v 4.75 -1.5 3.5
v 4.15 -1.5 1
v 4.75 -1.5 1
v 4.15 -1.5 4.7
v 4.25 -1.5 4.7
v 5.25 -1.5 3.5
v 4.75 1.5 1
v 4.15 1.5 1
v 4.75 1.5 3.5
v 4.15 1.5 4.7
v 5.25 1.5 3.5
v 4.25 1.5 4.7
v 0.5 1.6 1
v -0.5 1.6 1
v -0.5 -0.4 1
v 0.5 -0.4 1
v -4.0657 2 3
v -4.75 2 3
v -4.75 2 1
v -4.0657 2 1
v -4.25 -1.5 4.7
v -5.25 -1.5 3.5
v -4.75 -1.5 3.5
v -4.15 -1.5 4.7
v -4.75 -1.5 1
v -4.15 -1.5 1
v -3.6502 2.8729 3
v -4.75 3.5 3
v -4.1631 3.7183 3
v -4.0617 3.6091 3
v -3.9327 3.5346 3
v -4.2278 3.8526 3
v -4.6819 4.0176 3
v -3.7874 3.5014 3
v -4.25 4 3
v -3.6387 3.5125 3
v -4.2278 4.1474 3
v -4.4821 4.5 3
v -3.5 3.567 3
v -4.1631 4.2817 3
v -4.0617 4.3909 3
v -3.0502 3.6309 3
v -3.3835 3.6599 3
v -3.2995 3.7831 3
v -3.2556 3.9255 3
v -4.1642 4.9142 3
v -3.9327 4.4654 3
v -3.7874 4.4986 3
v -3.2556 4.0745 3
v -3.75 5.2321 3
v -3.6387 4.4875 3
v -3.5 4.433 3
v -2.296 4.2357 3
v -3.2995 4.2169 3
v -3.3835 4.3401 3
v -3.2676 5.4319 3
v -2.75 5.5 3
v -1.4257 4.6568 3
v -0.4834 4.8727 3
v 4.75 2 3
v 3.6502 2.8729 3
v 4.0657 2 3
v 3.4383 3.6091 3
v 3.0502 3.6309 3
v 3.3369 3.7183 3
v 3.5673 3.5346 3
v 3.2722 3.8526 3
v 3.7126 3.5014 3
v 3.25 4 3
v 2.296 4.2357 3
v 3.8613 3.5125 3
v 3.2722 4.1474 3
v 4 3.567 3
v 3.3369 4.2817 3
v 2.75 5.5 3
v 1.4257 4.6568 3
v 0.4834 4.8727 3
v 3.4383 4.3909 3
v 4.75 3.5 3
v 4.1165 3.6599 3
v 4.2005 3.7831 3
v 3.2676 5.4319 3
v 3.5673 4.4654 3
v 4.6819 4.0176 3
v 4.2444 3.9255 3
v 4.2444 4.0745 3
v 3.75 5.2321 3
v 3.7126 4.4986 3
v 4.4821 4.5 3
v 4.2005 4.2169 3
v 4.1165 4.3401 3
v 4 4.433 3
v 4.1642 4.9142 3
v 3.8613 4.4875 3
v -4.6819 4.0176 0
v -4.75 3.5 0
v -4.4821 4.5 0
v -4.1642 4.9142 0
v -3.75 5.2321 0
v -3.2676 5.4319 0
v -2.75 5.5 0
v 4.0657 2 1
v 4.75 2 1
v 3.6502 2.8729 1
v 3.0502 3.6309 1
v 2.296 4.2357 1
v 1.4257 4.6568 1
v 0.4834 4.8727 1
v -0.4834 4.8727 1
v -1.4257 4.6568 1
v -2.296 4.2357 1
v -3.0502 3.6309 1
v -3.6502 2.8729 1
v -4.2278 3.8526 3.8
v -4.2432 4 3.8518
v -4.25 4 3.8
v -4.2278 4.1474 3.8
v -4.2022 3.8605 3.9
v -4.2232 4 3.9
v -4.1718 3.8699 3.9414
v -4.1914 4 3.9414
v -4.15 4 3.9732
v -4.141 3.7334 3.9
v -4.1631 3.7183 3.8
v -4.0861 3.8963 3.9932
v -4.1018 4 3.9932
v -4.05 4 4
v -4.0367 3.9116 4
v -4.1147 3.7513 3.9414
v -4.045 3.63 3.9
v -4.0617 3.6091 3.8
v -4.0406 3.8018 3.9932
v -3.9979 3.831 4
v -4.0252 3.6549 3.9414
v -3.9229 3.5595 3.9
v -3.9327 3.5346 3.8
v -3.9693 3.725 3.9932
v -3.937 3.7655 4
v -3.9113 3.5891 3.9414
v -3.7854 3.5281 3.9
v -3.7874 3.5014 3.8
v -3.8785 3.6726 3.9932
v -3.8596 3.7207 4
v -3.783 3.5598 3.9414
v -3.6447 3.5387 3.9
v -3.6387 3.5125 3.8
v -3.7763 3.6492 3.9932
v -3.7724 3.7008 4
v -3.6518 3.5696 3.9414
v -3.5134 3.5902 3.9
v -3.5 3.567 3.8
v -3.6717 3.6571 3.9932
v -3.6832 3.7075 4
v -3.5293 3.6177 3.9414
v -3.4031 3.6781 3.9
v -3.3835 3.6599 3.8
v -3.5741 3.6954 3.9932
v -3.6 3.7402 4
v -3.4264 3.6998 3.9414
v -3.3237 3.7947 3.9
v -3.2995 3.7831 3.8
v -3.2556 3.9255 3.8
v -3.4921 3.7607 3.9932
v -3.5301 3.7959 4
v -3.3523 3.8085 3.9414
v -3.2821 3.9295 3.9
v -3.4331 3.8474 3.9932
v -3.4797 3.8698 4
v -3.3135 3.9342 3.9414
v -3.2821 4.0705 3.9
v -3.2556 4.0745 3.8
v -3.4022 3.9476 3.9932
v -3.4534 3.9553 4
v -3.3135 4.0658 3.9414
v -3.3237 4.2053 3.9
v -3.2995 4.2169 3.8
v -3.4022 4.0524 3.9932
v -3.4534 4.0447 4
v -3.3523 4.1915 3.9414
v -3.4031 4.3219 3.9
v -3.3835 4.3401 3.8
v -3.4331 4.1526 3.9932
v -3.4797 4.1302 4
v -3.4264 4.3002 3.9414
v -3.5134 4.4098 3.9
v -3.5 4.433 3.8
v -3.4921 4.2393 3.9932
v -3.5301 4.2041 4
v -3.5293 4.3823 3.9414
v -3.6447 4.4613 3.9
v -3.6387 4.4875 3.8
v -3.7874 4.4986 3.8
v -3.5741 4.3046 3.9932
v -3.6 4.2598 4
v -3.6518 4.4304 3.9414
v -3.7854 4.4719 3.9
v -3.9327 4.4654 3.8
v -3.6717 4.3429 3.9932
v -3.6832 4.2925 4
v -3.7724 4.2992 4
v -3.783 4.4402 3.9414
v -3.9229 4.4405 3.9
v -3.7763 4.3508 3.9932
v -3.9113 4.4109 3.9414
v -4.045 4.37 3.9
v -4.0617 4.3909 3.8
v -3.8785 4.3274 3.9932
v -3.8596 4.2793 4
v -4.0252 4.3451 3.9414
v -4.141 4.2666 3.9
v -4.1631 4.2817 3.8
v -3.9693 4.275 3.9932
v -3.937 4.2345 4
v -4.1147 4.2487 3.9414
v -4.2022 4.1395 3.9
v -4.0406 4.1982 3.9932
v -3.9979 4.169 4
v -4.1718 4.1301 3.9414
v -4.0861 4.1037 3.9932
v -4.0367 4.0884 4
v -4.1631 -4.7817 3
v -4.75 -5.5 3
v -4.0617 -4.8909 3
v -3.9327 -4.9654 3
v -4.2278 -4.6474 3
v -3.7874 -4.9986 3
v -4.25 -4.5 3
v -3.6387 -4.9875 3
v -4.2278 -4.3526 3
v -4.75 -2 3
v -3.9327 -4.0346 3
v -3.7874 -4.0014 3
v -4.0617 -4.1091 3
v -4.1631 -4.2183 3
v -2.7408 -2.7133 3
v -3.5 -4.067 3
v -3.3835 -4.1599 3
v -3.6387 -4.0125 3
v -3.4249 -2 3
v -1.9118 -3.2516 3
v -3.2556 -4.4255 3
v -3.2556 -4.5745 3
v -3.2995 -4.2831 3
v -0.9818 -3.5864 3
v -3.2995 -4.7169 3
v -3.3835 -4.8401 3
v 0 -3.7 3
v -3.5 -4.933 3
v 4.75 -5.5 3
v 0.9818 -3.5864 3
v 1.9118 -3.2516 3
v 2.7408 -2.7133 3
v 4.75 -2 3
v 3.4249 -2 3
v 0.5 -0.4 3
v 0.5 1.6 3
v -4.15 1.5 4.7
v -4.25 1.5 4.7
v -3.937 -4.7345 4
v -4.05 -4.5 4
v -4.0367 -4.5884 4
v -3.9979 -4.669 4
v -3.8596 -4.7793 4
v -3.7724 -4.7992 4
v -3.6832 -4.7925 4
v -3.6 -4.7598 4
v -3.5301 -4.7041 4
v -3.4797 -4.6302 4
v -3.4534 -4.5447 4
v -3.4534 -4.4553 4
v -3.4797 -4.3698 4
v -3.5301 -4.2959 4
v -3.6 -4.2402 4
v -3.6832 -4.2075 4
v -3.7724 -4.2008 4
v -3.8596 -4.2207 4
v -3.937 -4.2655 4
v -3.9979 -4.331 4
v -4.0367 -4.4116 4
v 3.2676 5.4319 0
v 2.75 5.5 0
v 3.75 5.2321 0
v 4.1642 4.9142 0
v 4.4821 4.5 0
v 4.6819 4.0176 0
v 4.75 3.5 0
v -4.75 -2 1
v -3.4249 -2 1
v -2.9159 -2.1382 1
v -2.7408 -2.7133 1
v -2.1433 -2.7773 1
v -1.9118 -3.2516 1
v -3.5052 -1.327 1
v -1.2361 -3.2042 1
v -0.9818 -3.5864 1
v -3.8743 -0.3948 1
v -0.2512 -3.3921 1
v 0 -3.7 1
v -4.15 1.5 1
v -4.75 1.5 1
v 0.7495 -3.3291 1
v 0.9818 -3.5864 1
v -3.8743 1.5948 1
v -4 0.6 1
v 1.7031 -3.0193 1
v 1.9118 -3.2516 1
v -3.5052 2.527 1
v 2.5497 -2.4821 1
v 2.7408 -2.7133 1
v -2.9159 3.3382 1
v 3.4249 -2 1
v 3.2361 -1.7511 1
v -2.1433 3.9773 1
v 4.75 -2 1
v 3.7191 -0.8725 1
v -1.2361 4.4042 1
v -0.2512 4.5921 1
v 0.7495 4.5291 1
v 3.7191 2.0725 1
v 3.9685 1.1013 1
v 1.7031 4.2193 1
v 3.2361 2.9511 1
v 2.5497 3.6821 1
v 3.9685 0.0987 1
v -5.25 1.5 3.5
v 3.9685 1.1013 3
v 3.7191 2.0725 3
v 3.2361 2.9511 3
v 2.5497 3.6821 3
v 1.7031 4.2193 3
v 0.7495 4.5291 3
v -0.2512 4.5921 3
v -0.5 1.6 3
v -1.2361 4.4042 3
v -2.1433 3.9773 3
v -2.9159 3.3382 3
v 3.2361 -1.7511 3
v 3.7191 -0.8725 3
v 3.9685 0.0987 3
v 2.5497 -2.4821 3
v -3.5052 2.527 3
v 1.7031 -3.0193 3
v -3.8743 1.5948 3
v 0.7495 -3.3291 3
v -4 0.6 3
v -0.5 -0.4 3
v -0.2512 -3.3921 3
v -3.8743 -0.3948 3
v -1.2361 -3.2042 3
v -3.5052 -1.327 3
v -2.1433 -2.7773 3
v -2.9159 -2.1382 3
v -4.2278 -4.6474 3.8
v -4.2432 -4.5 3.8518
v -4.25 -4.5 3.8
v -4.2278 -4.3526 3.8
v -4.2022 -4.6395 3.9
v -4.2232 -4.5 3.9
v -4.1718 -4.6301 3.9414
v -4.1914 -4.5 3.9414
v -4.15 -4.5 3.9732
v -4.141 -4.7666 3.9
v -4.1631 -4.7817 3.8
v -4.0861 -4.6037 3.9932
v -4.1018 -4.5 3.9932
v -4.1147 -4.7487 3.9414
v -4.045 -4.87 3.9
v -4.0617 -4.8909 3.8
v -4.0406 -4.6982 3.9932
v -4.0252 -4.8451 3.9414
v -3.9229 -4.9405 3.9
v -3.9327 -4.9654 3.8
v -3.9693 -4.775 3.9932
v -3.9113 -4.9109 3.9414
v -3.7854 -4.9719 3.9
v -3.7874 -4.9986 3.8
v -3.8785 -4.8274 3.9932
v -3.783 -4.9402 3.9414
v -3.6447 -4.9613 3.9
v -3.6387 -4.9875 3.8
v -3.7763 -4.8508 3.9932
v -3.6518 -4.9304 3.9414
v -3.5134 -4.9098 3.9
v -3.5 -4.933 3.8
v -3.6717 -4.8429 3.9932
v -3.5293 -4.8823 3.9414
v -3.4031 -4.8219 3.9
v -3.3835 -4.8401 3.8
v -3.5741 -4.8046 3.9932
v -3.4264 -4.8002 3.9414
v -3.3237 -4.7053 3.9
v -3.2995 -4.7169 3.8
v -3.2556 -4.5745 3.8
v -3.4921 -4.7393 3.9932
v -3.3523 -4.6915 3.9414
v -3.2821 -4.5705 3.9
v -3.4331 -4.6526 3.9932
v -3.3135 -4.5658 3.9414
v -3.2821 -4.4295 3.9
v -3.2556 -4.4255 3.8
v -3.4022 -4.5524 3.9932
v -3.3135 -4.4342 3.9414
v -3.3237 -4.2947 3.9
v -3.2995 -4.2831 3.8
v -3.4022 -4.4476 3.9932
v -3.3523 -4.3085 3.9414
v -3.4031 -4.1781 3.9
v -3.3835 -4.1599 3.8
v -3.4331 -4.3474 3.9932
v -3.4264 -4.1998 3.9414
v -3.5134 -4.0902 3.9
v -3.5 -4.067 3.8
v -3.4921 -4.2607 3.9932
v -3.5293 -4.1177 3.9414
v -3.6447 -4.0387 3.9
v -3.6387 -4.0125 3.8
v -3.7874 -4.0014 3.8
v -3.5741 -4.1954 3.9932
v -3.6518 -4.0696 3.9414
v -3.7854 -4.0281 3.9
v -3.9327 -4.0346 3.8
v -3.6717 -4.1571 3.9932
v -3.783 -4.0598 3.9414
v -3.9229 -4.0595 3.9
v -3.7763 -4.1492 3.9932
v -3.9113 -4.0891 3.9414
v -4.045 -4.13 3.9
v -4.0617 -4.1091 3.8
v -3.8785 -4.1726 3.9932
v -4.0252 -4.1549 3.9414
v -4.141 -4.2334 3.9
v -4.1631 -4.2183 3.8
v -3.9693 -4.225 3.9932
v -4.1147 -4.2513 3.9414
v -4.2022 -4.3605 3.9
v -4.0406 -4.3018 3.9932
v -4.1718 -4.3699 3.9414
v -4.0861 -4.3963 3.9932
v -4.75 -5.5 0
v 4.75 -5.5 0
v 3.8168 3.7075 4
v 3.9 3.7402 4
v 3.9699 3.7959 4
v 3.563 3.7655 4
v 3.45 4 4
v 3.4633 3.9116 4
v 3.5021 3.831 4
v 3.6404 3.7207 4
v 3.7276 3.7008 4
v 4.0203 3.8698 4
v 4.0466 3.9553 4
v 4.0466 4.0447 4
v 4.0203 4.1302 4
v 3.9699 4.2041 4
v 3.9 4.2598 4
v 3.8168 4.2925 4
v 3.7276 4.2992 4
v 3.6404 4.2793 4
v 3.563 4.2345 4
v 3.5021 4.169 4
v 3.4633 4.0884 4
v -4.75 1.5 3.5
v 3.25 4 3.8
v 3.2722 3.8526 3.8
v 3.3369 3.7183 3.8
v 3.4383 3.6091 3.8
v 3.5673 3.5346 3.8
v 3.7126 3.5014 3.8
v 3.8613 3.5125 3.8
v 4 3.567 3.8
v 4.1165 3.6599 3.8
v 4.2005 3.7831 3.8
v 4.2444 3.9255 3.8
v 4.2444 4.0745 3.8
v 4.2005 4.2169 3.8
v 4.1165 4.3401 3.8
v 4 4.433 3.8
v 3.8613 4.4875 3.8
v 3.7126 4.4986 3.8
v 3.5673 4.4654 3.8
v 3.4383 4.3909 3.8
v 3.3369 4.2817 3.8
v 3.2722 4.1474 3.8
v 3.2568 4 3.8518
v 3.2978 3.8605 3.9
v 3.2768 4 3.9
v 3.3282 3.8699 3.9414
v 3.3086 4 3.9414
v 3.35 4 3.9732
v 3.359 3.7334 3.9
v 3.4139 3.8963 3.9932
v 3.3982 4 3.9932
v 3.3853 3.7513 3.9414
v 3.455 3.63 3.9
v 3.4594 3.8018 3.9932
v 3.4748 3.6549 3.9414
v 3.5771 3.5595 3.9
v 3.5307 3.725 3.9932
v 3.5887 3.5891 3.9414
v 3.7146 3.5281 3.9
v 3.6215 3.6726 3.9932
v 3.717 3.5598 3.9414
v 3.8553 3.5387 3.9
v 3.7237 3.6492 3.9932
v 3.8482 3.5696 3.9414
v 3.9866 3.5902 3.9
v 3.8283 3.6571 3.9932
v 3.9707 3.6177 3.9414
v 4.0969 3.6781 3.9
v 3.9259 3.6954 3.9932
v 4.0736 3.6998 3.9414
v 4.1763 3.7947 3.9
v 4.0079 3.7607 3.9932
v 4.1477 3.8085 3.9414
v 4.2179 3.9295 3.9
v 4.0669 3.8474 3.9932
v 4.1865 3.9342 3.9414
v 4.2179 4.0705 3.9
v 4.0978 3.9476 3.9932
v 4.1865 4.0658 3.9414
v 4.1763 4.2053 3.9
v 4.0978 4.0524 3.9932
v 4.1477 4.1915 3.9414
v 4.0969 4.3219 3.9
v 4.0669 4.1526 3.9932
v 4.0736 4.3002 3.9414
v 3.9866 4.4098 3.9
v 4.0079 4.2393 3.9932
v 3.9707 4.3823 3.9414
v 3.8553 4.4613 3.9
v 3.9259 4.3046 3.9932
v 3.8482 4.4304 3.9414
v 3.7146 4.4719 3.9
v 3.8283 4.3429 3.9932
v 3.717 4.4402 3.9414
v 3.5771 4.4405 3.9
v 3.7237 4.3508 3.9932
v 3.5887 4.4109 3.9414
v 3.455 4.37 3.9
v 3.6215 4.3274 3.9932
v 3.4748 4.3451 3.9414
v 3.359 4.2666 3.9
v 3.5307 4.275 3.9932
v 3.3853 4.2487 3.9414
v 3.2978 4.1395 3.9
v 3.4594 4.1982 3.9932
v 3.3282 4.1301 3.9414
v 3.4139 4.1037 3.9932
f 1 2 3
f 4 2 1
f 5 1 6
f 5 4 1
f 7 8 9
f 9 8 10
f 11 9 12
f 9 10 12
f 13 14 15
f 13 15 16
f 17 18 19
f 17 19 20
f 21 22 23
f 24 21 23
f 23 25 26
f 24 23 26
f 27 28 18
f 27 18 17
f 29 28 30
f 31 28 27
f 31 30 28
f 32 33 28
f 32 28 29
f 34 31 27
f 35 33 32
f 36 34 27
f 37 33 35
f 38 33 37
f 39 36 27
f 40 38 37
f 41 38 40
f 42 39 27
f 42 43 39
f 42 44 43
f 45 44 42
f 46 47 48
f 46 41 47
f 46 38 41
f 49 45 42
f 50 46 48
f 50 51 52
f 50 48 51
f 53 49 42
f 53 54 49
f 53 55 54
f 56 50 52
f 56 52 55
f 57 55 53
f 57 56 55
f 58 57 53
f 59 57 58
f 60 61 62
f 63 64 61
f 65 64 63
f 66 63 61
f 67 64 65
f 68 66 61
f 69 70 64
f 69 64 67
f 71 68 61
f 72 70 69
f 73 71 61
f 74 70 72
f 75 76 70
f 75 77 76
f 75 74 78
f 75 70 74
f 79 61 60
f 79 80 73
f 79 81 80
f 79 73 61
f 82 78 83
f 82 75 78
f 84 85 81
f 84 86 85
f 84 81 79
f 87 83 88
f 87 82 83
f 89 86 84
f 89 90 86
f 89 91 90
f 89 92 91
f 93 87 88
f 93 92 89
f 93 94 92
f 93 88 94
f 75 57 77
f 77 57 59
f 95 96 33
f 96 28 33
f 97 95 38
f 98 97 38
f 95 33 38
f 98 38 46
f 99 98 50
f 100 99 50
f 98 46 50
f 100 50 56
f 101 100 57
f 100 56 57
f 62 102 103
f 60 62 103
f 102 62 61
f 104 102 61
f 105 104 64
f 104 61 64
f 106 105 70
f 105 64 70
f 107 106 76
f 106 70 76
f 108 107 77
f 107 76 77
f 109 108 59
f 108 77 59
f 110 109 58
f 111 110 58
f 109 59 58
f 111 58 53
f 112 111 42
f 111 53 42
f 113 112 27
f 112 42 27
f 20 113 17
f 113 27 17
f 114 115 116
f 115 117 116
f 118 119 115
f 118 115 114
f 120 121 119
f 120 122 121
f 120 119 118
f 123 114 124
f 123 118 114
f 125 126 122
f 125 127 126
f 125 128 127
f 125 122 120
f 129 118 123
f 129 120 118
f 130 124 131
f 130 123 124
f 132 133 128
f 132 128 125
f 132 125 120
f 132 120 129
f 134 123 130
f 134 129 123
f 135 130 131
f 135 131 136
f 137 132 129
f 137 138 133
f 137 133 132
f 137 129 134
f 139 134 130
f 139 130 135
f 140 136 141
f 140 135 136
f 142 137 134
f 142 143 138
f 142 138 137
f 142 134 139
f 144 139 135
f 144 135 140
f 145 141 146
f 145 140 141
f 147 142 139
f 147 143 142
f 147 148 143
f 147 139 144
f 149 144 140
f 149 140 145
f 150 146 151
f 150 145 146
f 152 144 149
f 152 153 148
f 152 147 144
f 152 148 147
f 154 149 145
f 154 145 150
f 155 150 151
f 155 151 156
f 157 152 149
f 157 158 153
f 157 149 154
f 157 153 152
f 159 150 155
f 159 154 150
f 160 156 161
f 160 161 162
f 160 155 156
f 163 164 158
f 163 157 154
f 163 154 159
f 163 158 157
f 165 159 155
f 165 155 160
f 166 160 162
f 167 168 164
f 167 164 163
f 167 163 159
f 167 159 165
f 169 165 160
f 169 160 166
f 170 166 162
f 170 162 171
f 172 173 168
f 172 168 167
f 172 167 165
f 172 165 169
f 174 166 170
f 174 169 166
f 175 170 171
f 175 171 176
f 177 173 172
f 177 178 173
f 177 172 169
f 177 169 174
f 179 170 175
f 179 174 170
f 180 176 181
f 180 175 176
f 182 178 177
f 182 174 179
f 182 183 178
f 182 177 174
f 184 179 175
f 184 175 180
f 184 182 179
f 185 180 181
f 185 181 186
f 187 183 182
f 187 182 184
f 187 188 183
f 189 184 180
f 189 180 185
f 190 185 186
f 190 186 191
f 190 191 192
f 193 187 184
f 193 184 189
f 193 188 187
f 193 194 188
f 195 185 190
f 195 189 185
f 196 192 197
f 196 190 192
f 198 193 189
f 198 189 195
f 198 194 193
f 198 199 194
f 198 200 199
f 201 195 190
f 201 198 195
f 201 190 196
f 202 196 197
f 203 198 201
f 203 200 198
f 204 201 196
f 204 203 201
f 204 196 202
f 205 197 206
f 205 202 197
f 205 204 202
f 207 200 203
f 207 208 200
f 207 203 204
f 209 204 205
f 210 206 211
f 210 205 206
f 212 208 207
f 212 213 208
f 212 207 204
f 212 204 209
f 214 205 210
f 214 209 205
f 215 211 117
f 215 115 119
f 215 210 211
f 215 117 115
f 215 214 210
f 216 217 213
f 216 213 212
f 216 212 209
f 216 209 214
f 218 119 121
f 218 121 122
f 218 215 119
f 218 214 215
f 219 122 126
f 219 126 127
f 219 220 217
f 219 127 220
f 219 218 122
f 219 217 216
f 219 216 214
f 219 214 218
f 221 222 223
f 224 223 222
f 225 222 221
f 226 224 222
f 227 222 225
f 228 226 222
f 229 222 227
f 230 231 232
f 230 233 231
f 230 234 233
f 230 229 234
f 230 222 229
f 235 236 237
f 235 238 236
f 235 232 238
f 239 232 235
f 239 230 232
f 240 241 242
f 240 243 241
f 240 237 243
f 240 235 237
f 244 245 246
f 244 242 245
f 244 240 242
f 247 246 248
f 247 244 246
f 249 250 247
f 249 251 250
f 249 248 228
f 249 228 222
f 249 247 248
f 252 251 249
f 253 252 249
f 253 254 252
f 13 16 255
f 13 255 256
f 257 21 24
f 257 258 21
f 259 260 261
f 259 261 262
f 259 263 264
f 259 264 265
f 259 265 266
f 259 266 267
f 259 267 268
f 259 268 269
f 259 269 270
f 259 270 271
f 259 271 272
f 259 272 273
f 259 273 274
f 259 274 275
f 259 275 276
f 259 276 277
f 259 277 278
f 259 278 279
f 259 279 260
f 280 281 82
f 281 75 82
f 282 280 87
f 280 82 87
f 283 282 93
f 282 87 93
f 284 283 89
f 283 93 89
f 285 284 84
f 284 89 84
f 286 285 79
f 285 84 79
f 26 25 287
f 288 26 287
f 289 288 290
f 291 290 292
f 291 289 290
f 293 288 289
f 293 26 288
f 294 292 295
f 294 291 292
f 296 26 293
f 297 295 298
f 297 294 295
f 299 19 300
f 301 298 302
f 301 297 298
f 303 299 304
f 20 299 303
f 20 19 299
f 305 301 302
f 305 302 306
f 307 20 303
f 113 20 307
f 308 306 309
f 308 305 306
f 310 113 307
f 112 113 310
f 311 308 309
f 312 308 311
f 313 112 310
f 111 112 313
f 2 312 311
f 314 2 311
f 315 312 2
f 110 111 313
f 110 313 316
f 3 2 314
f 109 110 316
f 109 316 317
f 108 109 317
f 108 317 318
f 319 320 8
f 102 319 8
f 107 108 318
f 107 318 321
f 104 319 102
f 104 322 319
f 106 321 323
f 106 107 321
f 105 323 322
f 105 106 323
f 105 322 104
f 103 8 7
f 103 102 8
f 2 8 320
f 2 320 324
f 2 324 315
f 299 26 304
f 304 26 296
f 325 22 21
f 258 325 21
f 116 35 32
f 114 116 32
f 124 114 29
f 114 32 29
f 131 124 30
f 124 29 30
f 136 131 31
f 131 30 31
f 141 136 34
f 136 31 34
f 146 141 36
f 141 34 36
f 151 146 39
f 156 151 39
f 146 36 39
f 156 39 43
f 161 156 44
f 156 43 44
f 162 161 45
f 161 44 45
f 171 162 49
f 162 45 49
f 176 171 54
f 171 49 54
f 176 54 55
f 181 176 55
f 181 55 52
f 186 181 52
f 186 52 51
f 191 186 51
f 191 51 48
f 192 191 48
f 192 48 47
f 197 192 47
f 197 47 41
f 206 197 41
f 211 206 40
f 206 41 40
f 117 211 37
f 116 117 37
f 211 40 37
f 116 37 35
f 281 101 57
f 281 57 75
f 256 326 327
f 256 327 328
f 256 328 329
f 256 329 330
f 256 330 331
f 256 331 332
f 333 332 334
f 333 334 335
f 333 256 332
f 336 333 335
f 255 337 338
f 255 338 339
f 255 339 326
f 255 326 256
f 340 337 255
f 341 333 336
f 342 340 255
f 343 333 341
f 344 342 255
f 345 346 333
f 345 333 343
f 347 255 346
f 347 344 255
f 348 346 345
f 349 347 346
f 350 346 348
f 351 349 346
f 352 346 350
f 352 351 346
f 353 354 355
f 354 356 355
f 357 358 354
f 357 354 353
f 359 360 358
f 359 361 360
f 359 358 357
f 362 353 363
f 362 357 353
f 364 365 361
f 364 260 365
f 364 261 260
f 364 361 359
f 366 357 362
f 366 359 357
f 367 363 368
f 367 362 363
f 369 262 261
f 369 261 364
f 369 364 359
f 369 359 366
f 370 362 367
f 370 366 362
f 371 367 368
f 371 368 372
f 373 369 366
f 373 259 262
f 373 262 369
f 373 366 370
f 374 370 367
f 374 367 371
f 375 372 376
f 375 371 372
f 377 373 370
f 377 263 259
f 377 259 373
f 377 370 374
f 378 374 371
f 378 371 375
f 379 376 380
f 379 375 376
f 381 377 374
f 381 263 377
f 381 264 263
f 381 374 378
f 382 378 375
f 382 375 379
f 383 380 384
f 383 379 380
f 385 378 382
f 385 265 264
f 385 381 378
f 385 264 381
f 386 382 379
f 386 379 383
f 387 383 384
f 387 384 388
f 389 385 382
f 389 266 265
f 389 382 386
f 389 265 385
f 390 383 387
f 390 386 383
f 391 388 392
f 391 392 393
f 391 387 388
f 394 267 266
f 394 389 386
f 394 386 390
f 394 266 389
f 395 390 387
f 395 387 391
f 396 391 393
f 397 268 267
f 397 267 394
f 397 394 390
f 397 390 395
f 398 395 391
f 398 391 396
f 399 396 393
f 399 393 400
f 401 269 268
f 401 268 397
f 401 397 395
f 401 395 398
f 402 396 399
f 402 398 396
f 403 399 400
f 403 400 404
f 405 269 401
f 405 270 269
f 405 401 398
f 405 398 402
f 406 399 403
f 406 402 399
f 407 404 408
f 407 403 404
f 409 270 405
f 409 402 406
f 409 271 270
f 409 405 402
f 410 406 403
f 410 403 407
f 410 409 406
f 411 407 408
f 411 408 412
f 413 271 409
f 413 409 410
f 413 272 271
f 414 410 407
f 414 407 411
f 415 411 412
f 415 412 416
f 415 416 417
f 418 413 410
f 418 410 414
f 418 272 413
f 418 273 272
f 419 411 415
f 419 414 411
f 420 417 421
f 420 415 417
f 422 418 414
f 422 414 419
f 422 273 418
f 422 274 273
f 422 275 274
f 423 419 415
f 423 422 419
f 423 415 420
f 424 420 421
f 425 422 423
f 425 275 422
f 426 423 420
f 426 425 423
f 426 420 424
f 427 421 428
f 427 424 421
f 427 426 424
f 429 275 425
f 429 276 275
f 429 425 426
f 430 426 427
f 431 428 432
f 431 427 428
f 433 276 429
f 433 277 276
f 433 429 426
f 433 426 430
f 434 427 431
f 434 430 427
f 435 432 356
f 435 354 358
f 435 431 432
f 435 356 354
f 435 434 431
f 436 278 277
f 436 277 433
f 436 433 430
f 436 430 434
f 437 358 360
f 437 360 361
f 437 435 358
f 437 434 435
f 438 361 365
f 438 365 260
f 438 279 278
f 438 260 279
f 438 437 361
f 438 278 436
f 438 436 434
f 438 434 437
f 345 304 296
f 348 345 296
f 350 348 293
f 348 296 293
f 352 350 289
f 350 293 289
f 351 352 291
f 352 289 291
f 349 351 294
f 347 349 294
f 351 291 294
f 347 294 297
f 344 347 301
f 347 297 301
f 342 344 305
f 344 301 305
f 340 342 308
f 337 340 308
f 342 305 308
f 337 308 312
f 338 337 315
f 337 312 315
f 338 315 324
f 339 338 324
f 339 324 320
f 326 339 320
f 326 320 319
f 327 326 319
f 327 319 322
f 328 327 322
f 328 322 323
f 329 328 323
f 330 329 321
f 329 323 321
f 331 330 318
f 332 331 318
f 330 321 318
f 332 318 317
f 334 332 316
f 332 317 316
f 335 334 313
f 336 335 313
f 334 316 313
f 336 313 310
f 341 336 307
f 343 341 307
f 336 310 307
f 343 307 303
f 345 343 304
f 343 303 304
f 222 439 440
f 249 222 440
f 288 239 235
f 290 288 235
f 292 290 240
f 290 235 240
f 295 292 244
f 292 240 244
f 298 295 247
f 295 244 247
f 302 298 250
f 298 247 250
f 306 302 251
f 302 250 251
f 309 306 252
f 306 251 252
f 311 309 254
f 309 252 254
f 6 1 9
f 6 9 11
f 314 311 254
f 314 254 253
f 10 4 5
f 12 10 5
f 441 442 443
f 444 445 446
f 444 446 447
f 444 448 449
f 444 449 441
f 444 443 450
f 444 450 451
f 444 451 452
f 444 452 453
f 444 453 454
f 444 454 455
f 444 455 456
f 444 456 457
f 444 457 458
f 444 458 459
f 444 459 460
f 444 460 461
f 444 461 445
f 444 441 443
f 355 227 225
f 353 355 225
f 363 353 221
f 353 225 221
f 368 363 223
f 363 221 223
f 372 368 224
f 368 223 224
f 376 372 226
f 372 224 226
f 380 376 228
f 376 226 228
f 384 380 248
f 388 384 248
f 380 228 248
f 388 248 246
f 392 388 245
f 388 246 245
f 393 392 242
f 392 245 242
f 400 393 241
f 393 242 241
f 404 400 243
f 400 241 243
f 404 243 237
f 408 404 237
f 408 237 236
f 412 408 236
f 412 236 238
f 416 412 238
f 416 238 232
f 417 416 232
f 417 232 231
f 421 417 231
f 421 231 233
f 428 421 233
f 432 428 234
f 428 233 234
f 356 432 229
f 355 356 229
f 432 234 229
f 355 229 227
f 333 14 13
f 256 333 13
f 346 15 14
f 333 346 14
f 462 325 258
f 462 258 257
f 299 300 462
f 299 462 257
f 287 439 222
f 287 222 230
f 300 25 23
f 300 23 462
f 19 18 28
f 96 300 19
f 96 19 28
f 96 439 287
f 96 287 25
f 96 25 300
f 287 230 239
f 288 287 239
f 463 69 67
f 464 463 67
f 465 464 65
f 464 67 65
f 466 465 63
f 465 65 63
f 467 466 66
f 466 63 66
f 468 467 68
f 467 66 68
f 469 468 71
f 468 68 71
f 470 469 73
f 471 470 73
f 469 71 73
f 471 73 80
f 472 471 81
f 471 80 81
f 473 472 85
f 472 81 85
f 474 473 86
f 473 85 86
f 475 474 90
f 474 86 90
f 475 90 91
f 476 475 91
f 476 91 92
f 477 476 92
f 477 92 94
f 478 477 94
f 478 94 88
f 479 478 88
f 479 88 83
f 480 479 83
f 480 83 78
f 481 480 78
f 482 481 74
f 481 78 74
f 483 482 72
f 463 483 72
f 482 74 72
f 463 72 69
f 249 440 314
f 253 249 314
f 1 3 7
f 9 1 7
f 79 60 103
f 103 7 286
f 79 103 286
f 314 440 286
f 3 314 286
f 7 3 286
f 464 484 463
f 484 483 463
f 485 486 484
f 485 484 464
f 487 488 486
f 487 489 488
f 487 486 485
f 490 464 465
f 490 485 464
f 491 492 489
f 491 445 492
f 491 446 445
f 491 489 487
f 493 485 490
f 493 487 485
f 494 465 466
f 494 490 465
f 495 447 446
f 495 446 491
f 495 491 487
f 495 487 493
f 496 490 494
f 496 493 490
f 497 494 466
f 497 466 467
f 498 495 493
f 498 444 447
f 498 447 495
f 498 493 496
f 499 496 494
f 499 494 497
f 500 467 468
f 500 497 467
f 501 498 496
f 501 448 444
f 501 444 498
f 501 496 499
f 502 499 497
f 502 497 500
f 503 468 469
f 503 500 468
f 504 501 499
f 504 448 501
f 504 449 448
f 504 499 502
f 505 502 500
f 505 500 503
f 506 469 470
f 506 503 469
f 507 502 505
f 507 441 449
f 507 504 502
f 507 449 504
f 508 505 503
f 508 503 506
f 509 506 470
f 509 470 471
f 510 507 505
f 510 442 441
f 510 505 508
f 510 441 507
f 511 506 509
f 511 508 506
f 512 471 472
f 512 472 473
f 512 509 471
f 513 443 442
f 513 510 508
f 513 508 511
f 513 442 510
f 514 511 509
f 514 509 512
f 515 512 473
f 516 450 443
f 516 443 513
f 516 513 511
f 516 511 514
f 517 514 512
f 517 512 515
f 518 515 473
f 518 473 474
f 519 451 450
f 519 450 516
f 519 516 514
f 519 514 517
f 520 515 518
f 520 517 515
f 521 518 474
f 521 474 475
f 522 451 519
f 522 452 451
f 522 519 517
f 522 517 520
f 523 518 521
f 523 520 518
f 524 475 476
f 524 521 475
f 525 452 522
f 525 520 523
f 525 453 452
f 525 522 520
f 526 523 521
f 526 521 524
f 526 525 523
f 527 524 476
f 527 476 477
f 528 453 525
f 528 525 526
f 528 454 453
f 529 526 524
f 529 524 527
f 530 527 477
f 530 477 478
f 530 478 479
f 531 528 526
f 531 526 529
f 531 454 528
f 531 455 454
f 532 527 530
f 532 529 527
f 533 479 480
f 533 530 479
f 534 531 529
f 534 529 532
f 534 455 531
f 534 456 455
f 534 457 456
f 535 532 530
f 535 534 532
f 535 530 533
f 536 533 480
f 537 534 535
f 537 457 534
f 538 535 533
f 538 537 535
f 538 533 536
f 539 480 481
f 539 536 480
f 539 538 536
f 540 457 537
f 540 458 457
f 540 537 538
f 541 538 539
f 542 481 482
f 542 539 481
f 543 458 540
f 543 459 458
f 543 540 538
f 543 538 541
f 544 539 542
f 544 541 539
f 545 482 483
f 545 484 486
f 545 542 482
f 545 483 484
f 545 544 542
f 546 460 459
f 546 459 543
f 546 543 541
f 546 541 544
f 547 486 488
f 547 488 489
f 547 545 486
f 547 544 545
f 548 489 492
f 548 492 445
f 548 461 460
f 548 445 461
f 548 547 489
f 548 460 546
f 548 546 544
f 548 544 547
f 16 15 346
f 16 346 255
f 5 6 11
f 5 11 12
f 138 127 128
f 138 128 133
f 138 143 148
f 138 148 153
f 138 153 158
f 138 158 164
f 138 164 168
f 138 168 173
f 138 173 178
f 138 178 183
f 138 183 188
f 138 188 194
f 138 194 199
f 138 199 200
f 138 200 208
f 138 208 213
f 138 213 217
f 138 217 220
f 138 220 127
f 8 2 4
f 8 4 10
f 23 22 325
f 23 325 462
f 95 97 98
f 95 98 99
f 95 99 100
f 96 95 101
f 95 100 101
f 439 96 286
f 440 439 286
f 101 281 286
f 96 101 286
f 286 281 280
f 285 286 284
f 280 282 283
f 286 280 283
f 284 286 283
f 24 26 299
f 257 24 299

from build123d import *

# Parameters (mm, degrees)
SKETCH1_W           = 9.5
SKETCH1_H           = 11
BOSS_EXTRUDE1_DEPTH = 3
SKETCH2_R           = 4.3
CUT_EXTRUDE1_DEPTH  = 2
FILLET1_R           = 2
SKETCH3_W           = 9.5
SKETCH3_H           = 4
CUT_EXTRUDE2_DEPTH  = 2
SKETCH4_W           = 0.6
SKETCH4_H           = 3
BOSS_EXTRUDE2_DEPTH = 3.7
SKETCH5_W           = 0.5
SKETCH5_H           = 1.2
BOSS_EXTRUDE3_DEPTH = 3
CUT_EXTRUDE3_DEPTH  = 10.932396488
SKETCH7_R           = 0.5
BOSS_EXTRUDE4_DEPTH = 1
FILLET2_R           = 0.2
SKETCH8_R           = 4
SKETCH8_W           = 1
SKETCH8_H           = 2
BOSS_EXTRUDE5_DEPTH = 2


with BuildPart() as part:
    # Sketch1 → Boss-Extrude1 (new body)
    with BuildSketch(Plane.XY):
        Rectangle(SKETCH1_W, SKETCH1_H)
    extrude(amount=BOSS_EXTRUDE1_DEPTH)

    # Sketch2 → Cut-Extrude1 (cut)
    with BuildSketch(Plane.XY.offset(3)):
        with Locations((0, 0.6)):
            Circle(SKETCH2_R)
    extrude(amount=-CUT_EXTRUDE1_DEPTH, mode=Mode.SUBTRACT)

    # Fillet1
    fillet1_edges = [part.edges().sort_by_distance(p)[0] for p in [
        (-4.75, 5.5, 1.5),
        (4.75, 5.5, 1.5),
    ]]
    fillet(fillet1_edges, radius=FILLET1_R)

    # Sketch3 → Cut-Extrude2 (cut)
    with BuildSketch(Plane.XY.offset(3)):
        Rectangle(SKETCH3_W, SKETCH3_H)
    extrude(amount=-CUT_EXTRUDE2_DEPTH, mode=Mode.SUBTRACT)

    # Sketch4 → Boss-Extrude2 (add)
    with BuildSketch(Plane.XY.offset(1)):
        with Locations((-4.45, 0)):
            Rectangle(SKETCH4_W, SKETCH4_H)
        with Locations((4.45, 0)):
            Rectangle(SKETCH4_W, SKETCH4_H)
    extrude(amount=BOSS_EXTRUDE2_DEPTH)

    # Sketch5 → Boss-Extrude3 (add)
    with BuildSketch(Plane.XZ.offset(1.5)):
        with Locations((5, 4.1)):
            Rectangle(SKETCH5_W, SKETCH5_H)
        with Locations((-5, 4.1)):
            Rectangle(SKETCH5_W, SKETCH5_H)
    extrude(amount=-BOSS_EXTRUDE3_DEPTH)

    # Sketch6 → Cut-Extrude3 (cut, through all)
    with BuildSketch(Plane.XZ.offset(1.5)):
        Polygon((5.25, 3.5), (4.25, 4.7), (5.25, 4.7), align=None)
        Polygon((-5.25, 3.5), (-4.25, 4.7), (-5.25, 4.7), align=None)
    extrude(amount=-CUT_EXTRUDE3_DEPTH, mode=Mode.SUBTRACT)

    # Sketch7 → Boss-Extrude4 (add)
    with BuildSketch(Plane.XY.offset(3)):
        with Locations(Location((-3.75, 4, 0), (0, 0, 180))):
            Circle(SKETCH7_R)
        with Locations(Location((3.75, 4, 0), (0, 0, 180))):
            Circle(SKETCH7_R)
        with Locations(Location((-3.75, -4.5, 0), (0, 0, 180))):
            Circle(SKETCH7_R)
    extrude(amount=BOSS_EXTRUDE4_DEPTH)

    # Fillet2
    fillet2_edges = [part.edges().sort_by_distance(p)[0] for p in [
        (-3.25, 4, 4),
        (4.25, 4, 4),
        (-3.25, -4.5, 4),
    ]]
    fillet(fillet2_edges, radius=FILLET2_R)

    # Sketch8 → Boss-Extrude5 (add)
    with BuildSketch(Plane.XY.offset(1)):
        with Locations(Location((0, 0.6, 0), (0, 0, 180))):
            Circle(SKETCH8_R)
        with Locations((0, 0.6)):
            Rectangle(SKETCH8_W, SKETCH8_H, mode=Mode.SUBTRACT)
    extrude(amount=BOSS_EXTRUDE5_DEPTH)


solid = part.part
